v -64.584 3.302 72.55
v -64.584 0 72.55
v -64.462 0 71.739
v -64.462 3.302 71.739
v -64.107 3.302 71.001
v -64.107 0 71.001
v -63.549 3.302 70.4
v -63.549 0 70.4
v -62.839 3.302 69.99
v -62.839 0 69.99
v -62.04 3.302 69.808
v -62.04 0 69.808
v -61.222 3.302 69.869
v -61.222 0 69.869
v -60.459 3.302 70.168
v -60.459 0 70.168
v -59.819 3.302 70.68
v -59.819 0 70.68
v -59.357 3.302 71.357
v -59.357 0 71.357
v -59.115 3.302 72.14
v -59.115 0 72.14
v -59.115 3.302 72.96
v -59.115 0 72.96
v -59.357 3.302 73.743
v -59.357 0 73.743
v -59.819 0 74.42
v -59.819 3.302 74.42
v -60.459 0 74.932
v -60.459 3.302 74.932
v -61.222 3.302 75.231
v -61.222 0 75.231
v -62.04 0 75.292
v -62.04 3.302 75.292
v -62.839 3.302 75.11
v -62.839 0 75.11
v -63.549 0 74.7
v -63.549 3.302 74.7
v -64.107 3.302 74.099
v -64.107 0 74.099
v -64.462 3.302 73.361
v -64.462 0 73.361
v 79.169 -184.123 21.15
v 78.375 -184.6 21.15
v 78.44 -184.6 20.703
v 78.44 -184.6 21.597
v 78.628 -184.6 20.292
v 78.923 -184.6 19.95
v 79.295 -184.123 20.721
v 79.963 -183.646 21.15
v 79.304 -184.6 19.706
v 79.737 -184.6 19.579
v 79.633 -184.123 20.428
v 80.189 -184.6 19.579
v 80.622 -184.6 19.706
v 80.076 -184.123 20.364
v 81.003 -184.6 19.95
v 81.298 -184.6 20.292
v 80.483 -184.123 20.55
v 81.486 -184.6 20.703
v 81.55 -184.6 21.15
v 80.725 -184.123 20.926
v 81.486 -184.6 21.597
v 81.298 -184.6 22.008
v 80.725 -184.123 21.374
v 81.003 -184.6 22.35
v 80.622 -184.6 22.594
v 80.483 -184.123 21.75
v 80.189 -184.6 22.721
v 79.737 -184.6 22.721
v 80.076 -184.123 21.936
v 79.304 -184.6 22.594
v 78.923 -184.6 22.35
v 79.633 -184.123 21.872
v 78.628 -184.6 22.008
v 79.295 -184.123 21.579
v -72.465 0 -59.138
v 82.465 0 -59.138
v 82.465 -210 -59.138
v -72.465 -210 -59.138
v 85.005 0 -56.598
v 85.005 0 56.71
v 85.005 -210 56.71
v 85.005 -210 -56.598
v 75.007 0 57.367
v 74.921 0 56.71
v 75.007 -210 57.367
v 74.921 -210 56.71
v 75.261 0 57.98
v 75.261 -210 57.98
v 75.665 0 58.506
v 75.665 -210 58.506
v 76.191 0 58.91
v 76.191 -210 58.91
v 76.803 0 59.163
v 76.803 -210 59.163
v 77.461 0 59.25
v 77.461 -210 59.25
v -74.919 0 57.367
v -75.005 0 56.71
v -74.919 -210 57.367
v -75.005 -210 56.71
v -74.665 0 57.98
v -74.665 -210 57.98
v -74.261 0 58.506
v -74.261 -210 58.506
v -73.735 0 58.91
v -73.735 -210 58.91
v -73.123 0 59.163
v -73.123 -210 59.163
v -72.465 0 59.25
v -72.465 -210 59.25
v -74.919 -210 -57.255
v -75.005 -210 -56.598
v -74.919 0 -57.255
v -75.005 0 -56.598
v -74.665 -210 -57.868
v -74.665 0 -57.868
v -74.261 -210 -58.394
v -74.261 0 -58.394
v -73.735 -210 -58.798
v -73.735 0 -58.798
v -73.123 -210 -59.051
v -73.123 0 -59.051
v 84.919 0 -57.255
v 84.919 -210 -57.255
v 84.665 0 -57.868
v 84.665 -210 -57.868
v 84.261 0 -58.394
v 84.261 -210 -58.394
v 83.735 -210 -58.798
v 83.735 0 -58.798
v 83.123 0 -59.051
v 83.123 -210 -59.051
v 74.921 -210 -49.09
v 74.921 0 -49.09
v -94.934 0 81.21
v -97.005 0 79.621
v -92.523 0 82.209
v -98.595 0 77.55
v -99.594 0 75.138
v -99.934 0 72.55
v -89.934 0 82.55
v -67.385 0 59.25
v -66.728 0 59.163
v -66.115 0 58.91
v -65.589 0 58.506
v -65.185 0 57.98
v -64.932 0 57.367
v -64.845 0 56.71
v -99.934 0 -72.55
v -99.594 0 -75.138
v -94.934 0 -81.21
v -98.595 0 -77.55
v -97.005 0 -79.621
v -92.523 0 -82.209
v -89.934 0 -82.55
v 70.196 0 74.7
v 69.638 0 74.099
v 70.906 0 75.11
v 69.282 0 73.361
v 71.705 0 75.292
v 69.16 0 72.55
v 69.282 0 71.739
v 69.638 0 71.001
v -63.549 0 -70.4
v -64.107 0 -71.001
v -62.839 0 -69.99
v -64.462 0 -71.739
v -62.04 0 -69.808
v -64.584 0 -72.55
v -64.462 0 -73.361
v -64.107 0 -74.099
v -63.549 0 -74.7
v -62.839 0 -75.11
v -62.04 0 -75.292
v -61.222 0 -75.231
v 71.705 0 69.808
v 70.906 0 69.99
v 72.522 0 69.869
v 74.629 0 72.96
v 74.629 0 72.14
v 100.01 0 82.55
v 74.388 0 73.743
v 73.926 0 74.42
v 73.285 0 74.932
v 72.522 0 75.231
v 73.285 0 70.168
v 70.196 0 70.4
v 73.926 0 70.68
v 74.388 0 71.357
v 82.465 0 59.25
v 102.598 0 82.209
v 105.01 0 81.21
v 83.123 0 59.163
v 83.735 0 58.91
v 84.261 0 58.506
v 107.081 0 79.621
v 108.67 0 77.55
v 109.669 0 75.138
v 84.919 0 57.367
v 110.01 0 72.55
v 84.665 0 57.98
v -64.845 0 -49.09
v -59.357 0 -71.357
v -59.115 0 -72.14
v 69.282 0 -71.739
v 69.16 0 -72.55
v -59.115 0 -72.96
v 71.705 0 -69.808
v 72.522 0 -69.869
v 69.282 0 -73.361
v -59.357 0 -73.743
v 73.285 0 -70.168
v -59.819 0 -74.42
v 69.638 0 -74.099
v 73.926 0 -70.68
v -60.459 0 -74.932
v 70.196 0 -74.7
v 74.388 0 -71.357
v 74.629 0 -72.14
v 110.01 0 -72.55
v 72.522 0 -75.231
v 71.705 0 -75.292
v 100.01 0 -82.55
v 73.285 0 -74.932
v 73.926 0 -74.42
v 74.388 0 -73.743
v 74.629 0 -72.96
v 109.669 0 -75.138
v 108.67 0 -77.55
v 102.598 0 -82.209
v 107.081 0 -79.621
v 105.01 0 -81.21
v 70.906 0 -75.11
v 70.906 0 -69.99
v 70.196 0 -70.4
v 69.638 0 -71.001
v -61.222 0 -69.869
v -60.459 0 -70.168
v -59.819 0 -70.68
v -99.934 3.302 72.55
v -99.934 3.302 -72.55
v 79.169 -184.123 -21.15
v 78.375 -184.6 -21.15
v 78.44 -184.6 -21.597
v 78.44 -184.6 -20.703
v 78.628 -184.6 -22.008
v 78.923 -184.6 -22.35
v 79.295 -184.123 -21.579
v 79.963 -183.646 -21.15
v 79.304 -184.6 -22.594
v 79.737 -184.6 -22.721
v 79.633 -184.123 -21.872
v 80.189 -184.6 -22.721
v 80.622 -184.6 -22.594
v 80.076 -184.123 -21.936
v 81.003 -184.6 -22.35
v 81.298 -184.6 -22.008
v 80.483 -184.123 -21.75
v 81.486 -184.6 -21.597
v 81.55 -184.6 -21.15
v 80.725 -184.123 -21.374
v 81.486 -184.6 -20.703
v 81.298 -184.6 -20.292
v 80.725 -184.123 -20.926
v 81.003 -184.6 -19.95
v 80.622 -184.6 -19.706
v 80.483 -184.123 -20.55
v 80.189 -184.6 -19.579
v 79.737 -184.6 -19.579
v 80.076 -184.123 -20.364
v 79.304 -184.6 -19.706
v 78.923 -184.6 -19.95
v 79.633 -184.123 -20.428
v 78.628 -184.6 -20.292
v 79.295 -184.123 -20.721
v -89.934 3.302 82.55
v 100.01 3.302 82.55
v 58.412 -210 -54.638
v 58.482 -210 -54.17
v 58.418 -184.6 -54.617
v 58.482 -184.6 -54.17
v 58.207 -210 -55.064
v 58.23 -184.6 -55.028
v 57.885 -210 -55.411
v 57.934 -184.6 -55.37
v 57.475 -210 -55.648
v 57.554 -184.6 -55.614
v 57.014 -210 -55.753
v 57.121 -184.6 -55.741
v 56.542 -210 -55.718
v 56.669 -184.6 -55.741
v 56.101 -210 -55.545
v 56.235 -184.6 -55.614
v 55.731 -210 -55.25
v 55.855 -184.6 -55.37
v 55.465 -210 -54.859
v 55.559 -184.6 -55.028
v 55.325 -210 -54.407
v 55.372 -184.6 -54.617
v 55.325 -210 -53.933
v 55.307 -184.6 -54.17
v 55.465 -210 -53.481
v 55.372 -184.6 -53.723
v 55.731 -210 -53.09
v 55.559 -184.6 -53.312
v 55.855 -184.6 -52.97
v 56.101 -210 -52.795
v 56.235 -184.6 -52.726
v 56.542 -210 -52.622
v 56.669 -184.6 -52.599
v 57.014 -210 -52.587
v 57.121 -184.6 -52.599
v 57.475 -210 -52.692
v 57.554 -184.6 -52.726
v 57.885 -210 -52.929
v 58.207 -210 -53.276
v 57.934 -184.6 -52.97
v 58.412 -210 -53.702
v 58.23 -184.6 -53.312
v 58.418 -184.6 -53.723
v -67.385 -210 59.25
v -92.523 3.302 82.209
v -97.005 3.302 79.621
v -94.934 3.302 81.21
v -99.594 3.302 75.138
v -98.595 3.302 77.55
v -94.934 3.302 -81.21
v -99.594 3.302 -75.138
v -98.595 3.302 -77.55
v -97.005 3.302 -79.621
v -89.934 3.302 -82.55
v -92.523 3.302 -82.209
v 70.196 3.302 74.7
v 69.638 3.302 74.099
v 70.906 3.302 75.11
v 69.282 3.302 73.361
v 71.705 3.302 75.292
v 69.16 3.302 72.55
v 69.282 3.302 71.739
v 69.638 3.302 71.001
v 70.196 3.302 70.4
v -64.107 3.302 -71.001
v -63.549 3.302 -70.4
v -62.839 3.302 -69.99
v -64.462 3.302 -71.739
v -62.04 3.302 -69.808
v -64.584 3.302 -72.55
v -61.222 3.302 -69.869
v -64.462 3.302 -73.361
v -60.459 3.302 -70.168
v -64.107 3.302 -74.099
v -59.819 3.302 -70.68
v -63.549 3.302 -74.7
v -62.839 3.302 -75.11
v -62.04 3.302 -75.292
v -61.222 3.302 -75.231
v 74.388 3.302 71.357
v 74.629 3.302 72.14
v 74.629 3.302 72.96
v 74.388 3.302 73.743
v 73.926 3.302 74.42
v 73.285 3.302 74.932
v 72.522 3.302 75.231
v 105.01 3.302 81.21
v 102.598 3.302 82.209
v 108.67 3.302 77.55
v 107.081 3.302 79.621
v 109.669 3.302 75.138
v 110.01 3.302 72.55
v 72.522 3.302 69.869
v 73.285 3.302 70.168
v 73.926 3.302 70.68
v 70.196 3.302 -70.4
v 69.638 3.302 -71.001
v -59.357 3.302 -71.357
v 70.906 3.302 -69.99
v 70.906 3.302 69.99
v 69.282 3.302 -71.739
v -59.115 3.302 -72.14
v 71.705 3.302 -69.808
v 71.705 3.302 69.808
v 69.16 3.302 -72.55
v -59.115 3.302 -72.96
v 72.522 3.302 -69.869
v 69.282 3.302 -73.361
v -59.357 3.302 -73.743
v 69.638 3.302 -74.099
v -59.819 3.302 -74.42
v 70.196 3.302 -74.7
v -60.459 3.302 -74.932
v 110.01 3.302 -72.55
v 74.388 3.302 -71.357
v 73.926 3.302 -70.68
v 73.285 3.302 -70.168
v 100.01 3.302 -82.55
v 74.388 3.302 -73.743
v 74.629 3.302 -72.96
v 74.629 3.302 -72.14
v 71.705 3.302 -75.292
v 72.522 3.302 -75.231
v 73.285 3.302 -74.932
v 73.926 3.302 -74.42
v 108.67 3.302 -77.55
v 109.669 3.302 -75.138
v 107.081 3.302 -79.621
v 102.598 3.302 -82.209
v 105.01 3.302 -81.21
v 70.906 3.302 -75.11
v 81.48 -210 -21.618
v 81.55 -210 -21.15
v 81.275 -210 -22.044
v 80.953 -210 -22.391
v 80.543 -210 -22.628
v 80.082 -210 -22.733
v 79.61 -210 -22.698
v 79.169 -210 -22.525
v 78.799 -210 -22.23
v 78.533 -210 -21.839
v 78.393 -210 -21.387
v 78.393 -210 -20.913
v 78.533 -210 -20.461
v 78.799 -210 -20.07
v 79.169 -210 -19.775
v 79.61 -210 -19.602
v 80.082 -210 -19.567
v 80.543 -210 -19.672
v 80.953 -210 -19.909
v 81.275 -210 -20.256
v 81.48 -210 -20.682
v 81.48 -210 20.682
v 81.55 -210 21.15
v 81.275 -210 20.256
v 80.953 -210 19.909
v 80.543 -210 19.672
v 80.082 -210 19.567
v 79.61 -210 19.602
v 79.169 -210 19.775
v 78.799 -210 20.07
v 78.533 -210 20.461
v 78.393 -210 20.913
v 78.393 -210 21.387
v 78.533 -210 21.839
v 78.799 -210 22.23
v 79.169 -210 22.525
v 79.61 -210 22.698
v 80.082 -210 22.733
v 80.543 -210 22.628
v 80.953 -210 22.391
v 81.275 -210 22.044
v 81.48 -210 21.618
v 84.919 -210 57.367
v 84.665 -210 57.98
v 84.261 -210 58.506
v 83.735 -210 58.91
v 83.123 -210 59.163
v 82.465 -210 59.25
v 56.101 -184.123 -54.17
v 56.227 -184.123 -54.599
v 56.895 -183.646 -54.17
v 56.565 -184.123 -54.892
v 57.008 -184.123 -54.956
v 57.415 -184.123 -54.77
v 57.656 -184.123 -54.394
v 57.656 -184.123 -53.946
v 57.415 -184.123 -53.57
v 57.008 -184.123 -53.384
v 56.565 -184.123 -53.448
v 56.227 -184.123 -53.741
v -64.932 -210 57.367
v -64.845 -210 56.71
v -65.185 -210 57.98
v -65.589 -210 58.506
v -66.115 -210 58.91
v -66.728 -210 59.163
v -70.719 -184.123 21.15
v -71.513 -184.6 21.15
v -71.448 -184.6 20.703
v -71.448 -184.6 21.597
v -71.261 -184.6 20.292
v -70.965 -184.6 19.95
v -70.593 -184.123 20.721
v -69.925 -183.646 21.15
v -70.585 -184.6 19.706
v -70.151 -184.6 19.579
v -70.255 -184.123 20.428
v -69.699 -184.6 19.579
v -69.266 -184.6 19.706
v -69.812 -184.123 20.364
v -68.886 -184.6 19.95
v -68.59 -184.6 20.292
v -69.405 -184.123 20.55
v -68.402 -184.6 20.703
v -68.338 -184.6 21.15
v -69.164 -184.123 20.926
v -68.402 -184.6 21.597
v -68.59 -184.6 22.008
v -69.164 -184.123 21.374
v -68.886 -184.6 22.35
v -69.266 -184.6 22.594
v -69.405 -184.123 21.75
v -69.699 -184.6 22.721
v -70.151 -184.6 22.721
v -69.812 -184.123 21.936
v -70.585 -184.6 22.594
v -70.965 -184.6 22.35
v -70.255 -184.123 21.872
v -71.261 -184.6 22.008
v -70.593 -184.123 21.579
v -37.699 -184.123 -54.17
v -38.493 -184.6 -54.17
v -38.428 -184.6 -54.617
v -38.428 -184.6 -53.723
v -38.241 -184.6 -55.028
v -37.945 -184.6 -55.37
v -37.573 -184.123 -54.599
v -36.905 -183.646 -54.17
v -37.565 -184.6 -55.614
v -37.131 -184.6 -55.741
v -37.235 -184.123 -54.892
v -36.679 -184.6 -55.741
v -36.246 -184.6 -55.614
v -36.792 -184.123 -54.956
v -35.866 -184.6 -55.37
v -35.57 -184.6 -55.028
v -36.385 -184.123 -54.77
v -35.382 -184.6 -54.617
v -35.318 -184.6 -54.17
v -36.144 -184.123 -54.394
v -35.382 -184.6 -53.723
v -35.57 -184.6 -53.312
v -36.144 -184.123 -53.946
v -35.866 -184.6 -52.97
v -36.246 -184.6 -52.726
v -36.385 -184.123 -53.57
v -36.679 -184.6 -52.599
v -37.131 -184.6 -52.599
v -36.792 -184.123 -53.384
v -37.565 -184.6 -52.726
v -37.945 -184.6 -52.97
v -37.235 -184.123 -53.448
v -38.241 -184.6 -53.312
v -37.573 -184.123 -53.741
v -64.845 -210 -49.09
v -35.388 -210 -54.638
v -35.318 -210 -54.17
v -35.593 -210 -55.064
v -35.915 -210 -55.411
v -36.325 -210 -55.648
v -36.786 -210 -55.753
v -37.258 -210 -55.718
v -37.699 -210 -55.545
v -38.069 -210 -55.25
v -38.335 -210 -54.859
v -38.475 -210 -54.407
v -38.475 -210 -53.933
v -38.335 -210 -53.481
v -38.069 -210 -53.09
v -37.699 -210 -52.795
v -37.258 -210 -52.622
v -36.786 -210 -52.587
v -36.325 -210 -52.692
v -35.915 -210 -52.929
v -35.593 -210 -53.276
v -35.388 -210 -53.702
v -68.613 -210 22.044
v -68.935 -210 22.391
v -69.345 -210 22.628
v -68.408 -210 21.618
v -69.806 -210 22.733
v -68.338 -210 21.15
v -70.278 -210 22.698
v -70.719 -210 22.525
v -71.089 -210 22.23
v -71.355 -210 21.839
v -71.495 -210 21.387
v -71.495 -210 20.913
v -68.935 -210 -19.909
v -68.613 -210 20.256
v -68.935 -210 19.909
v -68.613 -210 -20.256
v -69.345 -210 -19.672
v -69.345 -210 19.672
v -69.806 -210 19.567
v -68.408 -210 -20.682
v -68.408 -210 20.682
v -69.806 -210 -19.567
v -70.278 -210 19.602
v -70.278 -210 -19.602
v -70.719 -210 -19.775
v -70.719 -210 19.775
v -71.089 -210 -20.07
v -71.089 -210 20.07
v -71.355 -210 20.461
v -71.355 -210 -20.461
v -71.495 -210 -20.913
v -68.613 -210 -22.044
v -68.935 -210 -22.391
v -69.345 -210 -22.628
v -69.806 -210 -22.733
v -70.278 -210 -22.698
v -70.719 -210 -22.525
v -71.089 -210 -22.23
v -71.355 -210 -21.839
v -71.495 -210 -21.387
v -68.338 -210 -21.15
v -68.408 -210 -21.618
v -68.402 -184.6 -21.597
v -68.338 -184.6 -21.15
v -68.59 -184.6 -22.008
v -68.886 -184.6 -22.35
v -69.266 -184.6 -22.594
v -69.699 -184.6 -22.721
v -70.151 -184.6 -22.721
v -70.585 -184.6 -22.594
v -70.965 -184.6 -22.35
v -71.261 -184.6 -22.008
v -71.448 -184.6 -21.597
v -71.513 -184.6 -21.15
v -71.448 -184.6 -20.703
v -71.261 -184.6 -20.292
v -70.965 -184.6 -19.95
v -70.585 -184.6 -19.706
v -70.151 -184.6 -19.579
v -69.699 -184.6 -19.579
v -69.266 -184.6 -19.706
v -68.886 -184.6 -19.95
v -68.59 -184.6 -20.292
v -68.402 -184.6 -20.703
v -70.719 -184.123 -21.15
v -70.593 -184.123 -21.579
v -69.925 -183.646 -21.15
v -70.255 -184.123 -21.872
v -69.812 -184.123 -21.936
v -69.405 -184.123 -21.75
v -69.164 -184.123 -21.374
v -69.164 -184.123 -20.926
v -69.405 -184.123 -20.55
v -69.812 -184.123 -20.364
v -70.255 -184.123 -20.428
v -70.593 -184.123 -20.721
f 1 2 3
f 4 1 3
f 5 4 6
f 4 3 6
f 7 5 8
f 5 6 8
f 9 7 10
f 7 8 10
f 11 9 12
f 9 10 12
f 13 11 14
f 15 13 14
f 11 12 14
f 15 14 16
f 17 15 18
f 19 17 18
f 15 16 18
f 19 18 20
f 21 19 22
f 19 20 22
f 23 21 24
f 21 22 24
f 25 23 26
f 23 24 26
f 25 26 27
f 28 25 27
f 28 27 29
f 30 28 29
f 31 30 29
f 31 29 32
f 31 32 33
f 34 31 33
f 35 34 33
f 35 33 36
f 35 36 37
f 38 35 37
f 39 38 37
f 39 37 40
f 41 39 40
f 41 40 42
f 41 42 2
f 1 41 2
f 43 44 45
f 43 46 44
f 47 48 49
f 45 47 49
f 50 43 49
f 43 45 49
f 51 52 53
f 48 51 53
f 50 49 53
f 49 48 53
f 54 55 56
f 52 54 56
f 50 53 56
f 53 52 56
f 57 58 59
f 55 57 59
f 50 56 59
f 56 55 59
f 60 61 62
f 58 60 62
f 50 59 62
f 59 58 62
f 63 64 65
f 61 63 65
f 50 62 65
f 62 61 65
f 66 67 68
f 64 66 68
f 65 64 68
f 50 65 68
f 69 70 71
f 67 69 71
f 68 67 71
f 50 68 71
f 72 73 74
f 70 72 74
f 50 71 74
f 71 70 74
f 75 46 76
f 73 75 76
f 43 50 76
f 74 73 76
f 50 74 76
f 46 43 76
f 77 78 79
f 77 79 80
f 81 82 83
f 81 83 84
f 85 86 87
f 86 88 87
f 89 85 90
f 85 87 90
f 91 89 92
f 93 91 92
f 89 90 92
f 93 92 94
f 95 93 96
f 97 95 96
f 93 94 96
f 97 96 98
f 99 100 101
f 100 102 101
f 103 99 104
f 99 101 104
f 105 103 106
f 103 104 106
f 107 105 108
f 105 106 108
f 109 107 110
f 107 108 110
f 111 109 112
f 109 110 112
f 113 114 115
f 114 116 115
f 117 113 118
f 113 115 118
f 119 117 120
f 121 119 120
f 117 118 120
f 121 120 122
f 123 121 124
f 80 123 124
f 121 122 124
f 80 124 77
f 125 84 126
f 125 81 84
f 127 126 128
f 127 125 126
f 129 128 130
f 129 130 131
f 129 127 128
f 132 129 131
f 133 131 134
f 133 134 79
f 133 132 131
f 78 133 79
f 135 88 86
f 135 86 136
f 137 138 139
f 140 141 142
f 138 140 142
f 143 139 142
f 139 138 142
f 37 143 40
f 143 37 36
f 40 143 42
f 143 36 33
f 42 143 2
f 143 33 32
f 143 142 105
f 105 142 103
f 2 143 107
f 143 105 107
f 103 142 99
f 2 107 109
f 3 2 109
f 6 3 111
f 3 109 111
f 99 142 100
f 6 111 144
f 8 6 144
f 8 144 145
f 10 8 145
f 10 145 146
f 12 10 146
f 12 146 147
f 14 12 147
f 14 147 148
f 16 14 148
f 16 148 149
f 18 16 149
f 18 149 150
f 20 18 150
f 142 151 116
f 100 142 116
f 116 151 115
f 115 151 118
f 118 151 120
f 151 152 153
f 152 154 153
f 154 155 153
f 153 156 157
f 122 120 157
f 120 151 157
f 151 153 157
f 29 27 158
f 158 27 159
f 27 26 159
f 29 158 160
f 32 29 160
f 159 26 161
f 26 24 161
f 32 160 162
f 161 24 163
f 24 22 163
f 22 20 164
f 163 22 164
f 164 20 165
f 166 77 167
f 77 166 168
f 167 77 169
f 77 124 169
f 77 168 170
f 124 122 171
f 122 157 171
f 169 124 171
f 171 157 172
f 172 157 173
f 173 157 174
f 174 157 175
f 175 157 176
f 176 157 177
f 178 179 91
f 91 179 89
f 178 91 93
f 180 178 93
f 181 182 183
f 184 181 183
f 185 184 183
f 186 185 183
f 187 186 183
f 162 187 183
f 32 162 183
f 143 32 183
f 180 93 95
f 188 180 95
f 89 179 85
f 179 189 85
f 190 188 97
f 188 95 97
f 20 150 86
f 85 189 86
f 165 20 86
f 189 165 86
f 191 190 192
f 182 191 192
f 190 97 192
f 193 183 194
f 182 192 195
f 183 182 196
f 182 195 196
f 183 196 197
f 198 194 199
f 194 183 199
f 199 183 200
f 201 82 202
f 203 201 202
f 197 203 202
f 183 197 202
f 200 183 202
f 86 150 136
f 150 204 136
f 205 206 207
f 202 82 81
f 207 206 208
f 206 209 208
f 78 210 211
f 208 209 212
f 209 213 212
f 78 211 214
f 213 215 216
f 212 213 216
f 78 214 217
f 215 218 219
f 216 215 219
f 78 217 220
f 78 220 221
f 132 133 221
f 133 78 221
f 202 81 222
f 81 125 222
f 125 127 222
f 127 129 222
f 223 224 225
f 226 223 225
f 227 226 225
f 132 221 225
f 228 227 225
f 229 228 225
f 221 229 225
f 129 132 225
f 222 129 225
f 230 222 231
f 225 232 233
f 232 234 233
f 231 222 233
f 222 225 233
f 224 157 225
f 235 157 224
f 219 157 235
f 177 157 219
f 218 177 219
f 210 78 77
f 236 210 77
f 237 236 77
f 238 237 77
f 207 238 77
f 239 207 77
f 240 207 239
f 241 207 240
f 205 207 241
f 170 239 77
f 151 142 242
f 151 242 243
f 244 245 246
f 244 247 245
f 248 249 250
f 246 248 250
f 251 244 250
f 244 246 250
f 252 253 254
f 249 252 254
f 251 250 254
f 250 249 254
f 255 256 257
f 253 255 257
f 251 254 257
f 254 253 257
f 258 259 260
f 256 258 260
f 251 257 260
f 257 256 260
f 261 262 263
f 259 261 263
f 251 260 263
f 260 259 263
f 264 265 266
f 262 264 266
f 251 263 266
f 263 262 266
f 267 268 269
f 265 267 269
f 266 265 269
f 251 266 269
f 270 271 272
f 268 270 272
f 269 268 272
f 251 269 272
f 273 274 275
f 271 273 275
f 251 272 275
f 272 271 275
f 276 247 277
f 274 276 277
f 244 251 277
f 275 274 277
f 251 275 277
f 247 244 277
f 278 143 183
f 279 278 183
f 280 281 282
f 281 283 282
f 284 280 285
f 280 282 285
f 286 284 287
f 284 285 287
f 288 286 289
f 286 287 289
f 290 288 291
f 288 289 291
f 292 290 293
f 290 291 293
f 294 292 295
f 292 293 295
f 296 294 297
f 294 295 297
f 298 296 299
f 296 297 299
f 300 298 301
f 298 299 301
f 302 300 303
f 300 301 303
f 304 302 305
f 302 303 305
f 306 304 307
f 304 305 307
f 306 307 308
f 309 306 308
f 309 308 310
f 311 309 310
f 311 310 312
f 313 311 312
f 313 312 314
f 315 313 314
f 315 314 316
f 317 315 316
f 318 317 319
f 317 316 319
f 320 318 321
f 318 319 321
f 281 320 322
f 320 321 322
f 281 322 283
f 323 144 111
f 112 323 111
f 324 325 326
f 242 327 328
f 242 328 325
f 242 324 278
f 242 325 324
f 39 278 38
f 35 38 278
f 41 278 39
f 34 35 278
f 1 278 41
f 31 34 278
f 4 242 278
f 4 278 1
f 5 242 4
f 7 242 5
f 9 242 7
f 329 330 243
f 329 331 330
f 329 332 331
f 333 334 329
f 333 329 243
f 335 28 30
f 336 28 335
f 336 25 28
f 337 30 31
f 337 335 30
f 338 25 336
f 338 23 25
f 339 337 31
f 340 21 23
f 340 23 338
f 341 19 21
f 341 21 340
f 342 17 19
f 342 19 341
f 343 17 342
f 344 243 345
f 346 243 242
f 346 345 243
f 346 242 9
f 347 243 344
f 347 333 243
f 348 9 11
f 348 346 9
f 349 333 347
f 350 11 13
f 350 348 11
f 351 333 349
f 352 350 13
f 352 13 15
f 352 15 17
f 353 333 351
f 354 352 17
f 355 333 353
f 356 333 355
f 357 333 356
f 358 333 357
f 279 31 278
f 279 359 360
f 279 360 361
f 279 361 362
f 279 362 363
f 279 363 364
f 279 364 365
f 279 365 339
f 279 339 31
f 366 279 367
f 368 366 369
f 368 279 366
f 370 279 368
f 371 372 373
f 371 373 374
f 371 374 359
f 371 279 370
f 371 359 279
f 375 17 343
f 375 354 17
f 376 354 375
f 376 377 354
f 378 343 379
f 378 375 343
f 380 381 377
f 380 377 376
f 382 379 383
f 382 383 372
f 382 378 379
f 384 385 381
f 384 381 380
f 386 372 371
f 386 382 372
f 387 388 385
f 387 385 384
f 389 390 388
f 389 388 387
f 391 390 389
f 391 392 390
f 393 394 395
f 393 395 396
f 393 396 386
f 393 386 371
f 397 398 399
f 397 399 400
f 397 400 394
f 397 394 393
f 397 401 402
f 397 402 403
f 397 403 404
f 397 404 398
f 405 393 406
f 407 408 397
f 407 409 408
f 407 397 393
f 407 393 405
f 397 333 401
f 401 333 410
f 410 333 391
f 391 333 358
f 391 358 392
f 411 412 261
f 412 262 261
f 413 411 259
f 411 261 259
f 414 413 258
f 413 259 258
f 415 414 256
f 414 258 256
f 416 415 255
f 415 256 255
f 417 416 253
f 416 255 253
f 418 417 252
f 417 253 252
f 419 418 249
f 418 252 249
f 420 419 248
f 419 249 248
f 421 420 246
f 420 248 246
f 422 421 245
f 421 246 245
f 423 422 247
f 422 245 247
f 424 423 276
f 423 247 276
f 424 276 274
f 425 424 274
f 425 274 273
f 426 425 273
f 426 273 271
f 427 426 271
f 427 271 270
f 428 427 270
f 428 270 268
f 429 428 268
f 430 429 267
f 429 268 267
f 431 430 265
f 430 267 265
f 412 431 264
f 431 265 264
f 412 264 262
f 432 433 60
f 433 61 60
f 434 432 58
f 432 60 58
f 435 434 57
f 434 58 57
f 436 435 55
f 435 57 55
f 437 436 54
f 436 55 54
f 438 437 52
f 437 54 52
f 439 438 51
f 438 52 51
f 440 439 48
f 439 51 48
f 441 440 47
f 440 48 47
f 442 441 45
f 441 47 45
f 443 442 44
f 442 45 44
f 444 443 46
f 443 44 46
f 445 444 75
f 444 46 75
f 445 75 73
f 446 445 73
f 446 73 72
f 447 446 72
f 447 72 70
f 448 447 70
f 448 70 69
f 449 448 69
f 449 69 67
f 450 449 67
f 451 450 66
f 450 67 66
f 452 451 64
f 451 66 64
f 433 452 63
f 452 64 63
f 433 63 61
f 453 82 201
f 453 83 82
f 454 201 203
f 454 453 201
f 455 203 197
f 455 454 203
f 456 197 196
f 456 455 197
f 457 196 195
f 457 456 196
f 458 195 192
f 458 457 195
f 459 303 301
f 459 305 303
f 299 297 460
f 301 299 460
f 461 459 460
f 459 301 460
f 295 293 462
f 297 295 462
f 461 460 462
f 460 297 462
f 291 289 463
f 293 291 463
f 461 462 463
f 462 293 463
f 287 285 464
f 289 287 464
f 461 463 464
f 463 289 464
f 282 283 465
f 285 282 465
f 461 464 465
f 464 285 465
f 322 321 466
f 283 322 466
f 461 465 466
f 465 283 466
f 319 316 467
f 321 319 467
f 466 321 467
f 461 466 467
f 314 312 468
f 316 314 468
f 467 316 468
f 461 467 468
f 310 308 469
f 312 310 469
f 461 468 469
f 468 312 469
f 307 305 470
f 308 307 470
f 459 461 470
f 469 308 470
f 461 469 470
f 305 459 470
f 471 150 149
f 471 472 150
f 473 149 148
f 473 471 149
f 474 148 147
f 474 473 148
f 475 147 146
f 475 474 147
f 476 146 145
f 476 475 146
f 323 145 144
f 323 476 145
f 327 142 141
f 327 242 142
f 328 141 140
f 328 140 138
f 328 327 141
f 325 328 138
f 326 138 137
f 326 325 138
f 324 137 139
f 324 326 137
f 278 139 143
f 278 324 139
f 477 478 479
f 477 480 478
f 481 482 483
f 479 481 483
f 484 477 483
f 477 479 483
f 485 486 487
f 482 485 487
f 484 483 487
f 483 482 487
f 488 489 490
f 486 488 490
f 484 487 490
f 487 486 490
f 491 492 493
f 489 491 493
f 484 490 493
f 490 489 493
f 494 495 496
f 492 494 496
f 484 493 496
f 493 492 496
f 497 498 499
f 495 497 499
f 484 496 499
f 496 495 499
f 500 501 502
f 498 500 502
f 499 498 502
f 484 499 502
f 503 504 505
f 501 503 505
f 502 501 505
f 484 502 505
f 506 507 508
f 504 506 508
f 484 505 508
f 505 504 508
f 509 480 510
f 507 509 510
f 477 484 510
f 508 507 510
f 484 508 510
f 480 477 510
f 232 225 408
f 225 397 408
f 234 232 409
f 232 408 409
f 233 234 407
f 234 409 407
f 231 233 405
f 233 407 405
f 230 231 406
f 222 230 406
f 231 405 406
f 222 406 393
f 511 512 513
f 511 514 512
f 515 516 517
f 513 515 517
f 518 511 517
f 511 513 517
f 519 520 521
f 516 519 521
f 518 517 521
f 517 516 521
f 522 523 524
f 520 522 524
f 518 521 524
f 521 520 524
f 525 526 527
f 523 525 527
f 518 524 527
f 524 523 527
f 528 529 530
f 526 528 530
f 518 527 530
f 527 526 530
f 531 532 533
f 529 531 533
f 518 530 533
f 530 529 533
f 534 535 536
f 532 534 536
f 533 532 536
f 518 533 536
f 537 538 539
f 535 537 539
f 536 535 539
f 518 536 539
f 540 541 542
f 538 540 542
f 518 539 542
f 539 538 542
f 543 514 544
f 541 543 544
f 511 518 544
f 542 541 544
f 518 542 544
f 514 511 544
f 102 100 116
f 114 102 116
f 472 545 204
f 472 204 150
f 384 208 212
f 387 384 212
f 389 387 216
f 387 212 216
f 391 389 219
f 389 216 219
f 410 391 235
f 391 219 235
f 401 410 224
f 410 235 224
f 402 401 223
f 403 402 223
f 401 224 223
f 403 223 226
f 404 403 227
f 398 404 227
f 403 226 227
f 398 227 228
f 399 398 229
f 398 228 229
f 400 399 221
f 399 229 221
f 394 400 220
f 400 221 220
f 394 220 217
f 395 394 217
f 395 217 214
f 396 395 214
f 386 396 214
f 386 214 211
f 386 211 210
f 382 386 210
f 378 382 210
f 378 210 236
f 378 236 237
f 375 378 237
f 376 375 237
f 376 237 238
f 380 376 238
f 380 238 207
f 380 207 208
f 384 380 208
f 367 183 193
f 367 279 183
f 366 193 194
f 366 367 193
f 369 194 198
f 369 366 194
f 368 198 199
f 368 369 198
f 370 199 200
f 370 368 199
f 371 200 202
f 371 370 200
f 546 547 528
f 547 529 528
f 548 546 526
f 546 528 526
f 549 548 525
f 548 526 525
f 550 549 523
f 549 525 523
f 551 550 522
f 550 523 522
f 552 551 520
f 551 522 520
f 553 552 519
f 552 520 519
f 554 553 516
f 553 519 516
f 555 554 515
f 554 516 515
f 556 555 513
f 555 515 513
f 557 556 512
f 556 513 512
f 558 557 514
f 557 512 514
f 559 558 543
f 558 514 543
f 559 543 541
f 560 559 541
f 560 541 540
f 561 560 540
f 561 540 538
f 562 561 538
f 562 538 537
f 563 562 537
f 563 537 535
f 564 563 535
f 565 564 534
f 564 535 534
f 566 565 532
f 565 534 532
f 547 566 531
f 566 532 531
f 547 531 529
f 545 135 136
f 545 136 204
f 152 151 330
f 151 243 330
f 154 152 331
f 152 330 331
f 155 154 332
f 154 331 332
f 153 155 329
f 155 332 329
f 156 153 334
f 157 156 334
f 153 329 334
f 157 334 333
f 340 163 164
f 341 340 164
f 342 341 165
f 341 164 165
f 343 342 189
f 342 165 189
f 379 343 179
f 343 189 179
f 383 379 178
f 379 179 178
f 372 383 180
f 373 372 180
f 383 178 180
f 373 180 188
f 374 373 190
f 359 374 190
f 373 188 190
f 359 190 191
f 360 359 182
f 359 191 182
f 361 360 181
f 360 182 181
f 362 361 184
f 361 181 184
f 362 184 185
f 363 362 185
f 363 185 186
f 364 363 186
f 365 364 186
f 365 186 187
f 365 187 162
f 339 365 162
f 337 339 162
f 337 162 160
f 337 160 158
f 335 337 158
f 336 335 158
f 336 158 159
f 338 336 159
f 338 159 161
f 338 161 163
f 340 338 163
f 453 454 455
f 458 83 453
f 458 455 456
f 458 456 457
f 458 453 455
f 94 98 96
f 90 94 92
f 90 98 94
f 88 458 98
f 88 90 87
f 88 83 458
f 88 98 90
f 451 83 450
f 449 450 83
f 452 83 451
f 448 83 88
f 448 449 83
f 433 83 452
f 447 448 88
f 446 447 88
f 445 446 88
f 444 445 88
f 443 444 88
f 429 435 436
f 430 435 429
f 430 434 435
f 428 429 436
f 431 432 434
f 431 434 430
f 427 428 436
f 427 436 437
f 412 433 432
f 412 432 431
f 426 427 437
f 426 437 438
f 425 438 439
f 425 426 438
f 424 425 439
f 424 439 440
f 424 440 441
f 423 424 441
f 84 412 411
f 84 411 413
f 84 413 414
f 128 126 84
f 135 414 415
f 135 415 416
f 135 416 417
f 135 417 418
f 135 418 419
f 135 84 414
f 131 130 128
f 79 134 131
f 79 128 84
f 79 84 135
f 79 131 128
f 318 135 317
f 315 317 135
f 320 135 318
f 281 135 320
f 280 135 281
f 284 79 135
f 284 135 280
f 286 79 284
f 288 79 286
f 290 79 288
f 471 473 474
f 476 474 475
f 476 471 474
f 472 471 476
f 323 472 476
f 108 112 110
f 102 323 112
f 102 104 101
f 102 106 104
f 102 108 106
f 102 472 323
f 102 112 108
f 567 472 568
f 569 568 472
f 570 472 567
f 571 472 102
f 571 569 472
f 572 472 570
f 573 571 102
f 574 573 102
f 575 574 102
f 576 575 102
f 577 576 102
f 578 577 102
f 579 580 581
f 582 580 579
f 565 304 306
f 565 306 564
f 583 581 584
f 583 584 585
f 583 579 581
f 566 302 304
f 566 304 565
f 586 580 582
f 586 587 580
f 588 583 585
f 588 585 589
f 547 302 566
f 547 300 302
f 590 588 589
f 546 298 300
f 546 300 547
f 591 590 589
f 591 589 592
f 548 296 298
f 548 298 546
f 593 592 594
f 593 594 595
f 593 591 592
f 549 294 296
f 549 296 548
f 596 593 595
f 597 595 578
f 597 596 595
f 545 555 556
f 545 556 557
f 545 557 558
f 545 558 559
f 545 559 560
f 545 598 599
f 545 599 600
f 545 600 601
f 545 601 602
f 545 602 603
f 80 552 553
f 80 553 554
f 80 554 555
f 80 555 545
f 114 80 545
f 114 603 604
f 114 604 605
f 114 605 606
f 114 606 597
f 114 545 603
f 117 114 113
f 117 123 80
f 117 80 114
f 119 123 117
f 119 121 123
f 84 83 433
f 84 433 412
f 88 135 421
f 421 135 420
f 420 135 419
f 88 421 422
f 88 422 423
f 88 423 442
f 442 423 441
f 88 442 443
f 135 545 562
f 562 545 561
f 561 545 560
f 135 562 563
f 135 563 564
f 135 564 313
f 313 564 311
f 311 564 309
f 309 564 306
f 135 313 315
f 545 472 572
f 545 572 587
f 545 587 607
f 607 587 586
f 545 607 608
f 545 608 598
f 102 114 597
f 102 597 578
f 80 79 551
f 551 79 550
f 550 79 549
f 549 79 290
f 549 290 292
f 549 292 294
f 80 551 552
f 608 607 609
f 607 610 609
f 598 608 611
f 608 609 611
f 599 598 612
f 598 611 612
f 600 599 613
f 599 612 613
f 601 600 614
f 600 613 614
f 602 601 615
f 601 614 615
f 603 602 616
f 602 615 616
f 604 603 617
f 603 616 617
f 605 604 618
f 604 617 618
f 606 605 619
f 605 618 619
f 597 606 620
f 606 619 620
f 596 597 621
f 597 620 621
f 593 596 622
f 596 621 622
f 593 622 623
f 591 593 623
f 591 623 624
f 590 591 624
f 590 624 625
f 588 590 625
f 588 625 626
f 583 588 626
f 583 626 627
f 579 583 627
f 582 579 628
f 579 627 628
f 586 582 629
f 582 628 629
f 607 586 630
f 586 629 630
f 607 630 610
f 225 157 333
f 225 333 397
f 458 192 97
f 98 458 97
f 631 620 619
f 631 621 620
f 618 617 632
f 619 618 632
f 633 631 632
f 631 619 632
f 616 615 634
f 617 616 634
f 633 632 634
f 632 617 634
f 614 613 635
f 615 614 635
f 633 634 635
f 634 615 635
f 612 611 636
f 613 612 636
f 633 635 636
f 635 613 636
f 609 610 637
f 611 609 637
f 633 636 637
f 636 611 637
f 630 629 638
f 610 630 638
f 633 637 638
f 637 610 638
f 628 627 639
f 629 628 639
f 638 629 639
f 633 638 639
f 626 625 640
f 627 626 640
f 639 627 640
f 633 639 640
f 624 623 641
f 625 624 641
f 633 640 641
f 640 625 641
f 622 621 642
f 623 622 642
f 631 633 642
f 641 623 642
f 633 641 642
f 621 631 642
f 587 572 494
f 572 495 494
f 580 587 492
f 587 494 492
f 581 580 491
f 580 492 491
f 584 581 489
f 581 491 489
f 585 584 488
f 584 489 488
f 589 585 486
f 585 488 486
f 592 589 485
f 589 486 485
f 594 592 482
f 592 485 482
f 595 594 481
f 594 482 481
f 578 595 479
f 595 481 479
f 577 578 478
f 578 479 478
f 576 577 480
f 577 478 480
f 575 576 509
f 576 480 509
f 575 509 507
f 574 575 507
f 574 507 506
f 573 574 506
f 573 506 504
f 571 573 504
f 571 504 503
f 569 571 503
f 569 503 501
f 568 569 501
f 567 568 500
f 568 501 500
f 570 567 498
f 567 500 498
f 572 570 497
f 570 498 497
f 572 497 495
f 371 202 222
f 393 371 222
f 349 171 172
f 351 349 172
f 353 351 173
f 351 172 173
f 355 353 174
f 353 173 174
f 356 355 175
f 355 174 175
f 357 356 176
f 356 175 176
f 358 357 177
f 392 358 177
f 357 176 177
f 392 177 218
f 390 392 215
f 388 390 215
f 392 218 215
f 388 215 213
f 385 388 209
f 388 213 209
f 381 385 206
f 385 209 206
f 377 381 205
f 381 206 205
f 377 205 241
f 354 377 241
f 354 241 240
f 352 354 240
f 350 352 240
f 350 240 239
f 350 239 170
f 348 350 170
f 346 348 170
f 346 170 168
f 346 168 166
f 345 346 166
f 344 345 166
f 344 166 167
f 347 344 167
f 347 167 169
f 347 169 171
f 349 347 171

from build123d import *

# Parameters (mm, degrees)
SKETCH1_W                      = 209.944601778
SKETCH1_H                      = 165.1
BOSS_EXTRUDE1_DEPTH            = 3.302
M5_CLEARANCE_HOLE2_D           = 5.5
M5_CLEARANCE_HOLE2_DEPTH       = 3.302
FILLET1_R                      = 10
BOSS_EXTRUDE2_DEPTH            = 210
F_1_8_0_1250_DOWEL_HOLE1_D     = 3.175
F_1_8_0_1250_DOWEL_HOLE1_DEPTH = 25.4
F_1_8_0_1250_DOWEL_HOLE1_TIP   = 0.953866233
SKETCH25_W                     = 160.0102
SKETCH25_H                     = 1.27
CUT_EXTRUDE1_DEPTH             = 210
SKETCH26_W                     = 160.0102
SKETCH26_H                     = 1.1578
BOSS_EXTRUDE3_DEPTH            = 210
FILLET2_R                      = 2.54


with BuildPart() as part:
    # Sketch1 → Boss-Extrude1 (new body)
    with BuildSketch(Plane(origin=(0, 0, 0), x_dir=(1, 0, 0), z_dir=(0, 1, 0))):
        with Locations((5.037898889, 0)):
            Rectangle(SKETCH1_W, SKETCH1_H)
    extrude(amount=BOSS_EXTRUDE1_DEPTH)

    # M5 Clearance Hole2
    with Locations(Plane(origin=(0, 3.302, 0), x_dir=(1, 0, 0), z_dir=(0, 1, 0))):
        with Locations((71.910199778, -72.55), (-61.834402, -72.55), (71.910199778, 72.55), (-61.834402, 72.55)):
            Hole(M5_CLEARANCE_HOLE2_D / 2, depth=M5_CLEARANCE_HOLE2_DEPTH)

    # Fillet1
    fillet1_edges = [part.edges().sort_by_distance(p)[0] for p in [
        (110.010199778, 1.651, 82.55),
        (-99.934402, 1.651, 82.55),
        (-99.934402, 1.651, -82.55),
        (110.010199778, 1.651, -82.55),
    ]]
    fillet(fillet1_edges, radius=FILLET1_R)

    # Sketch12 → Boss-Extrude2 (add)
    with BuildSketch(Plane.XZ):
        Polygon((85.0051, -59.25), (85.0051, 59.25), (74.9209, 59.25), (74.9209, -49.09), (-64.8451, -49.09), (-64.8451, 59.25), (-75.0051, 59.25), (-75.0051, -59.25), align=None)
    extrude(amount=BOSS_EXTRUDE2_DEPTH)

    # 1/8 (0.1250) Dowel Hole1
    with Locations(Plane(origin=(0, -210, 0), x_dir=(-1, 0, 0), z_dir=(0, -1, 0))):
        with Locations((69.9251, -21.15), (69.9251, 21.15), (36.9051, 54.17), (-56.8949, 54.17), (-79.963, 21.15), (-79.963, -21.15)):
            Hole(F_1_8_0_1250_DOWEL_HOLE1_D / 2, depth=F_1_8_0_1250_DOWEL_HOLE1_DEPTH)
            with Locations((0, 0, -(F_1_8_0_1250_DOWEL_HOLE1_DEPTH + F_1_8_0_1250_DOWEL_HOLE1_TIP / 2))):  # 118° drill point
                Cone(0, F_1_8_0_1250_DOWEL_HOLE1_D / 2, F_1_8_0_1250_DOWEL_HOLE1_TIP, mode=Mode.SUBTRACT)

    # Sketch25 → Cut-Extrude1 (cut)
    with BuildSketch(Plane(origin=(0, -210, 0), x_dir=(-1, 0, 0), z_dir=(0, -1, 0))):
        with Locations((-5, 58.615)):
            Rectangle(SKETCH25_W, SKETCH25_H)
    extrude(amount=-CUT_EXTRUDE1_DEPTH, mode=Mode.SUBTRACT)

    # Sketch26 → Boss-Extrude3 (add)
    with BuildSketch(Plane(origin=(0, -210, 0), x_dir=(-1, 0, 0), z_dir=(0, -1, 0))):
        with Locations((-5, 58.5589)):
            Rectangle(SKETCH26_W, SKETCH26_H)
    extrude(amount=-BOSS_EXTRUDE3_DEPTH)

    # Fillet2
    fillet2_edges = [part.edges().sort_by_distance(p)[0] for p in [
        (-75.0051, -105, -59.1378),
        (85.0051, -105, -59.1378),
        (74.9209, -105, 59.25),
        (-64.8451, -105, 59.25),
        (-75.0051, -105, 59.25),
        (85.0051, -105, 59.25),
    ]]
    fillet(fillet2_edges, radius=FILLET2_R)


solid = part.part
